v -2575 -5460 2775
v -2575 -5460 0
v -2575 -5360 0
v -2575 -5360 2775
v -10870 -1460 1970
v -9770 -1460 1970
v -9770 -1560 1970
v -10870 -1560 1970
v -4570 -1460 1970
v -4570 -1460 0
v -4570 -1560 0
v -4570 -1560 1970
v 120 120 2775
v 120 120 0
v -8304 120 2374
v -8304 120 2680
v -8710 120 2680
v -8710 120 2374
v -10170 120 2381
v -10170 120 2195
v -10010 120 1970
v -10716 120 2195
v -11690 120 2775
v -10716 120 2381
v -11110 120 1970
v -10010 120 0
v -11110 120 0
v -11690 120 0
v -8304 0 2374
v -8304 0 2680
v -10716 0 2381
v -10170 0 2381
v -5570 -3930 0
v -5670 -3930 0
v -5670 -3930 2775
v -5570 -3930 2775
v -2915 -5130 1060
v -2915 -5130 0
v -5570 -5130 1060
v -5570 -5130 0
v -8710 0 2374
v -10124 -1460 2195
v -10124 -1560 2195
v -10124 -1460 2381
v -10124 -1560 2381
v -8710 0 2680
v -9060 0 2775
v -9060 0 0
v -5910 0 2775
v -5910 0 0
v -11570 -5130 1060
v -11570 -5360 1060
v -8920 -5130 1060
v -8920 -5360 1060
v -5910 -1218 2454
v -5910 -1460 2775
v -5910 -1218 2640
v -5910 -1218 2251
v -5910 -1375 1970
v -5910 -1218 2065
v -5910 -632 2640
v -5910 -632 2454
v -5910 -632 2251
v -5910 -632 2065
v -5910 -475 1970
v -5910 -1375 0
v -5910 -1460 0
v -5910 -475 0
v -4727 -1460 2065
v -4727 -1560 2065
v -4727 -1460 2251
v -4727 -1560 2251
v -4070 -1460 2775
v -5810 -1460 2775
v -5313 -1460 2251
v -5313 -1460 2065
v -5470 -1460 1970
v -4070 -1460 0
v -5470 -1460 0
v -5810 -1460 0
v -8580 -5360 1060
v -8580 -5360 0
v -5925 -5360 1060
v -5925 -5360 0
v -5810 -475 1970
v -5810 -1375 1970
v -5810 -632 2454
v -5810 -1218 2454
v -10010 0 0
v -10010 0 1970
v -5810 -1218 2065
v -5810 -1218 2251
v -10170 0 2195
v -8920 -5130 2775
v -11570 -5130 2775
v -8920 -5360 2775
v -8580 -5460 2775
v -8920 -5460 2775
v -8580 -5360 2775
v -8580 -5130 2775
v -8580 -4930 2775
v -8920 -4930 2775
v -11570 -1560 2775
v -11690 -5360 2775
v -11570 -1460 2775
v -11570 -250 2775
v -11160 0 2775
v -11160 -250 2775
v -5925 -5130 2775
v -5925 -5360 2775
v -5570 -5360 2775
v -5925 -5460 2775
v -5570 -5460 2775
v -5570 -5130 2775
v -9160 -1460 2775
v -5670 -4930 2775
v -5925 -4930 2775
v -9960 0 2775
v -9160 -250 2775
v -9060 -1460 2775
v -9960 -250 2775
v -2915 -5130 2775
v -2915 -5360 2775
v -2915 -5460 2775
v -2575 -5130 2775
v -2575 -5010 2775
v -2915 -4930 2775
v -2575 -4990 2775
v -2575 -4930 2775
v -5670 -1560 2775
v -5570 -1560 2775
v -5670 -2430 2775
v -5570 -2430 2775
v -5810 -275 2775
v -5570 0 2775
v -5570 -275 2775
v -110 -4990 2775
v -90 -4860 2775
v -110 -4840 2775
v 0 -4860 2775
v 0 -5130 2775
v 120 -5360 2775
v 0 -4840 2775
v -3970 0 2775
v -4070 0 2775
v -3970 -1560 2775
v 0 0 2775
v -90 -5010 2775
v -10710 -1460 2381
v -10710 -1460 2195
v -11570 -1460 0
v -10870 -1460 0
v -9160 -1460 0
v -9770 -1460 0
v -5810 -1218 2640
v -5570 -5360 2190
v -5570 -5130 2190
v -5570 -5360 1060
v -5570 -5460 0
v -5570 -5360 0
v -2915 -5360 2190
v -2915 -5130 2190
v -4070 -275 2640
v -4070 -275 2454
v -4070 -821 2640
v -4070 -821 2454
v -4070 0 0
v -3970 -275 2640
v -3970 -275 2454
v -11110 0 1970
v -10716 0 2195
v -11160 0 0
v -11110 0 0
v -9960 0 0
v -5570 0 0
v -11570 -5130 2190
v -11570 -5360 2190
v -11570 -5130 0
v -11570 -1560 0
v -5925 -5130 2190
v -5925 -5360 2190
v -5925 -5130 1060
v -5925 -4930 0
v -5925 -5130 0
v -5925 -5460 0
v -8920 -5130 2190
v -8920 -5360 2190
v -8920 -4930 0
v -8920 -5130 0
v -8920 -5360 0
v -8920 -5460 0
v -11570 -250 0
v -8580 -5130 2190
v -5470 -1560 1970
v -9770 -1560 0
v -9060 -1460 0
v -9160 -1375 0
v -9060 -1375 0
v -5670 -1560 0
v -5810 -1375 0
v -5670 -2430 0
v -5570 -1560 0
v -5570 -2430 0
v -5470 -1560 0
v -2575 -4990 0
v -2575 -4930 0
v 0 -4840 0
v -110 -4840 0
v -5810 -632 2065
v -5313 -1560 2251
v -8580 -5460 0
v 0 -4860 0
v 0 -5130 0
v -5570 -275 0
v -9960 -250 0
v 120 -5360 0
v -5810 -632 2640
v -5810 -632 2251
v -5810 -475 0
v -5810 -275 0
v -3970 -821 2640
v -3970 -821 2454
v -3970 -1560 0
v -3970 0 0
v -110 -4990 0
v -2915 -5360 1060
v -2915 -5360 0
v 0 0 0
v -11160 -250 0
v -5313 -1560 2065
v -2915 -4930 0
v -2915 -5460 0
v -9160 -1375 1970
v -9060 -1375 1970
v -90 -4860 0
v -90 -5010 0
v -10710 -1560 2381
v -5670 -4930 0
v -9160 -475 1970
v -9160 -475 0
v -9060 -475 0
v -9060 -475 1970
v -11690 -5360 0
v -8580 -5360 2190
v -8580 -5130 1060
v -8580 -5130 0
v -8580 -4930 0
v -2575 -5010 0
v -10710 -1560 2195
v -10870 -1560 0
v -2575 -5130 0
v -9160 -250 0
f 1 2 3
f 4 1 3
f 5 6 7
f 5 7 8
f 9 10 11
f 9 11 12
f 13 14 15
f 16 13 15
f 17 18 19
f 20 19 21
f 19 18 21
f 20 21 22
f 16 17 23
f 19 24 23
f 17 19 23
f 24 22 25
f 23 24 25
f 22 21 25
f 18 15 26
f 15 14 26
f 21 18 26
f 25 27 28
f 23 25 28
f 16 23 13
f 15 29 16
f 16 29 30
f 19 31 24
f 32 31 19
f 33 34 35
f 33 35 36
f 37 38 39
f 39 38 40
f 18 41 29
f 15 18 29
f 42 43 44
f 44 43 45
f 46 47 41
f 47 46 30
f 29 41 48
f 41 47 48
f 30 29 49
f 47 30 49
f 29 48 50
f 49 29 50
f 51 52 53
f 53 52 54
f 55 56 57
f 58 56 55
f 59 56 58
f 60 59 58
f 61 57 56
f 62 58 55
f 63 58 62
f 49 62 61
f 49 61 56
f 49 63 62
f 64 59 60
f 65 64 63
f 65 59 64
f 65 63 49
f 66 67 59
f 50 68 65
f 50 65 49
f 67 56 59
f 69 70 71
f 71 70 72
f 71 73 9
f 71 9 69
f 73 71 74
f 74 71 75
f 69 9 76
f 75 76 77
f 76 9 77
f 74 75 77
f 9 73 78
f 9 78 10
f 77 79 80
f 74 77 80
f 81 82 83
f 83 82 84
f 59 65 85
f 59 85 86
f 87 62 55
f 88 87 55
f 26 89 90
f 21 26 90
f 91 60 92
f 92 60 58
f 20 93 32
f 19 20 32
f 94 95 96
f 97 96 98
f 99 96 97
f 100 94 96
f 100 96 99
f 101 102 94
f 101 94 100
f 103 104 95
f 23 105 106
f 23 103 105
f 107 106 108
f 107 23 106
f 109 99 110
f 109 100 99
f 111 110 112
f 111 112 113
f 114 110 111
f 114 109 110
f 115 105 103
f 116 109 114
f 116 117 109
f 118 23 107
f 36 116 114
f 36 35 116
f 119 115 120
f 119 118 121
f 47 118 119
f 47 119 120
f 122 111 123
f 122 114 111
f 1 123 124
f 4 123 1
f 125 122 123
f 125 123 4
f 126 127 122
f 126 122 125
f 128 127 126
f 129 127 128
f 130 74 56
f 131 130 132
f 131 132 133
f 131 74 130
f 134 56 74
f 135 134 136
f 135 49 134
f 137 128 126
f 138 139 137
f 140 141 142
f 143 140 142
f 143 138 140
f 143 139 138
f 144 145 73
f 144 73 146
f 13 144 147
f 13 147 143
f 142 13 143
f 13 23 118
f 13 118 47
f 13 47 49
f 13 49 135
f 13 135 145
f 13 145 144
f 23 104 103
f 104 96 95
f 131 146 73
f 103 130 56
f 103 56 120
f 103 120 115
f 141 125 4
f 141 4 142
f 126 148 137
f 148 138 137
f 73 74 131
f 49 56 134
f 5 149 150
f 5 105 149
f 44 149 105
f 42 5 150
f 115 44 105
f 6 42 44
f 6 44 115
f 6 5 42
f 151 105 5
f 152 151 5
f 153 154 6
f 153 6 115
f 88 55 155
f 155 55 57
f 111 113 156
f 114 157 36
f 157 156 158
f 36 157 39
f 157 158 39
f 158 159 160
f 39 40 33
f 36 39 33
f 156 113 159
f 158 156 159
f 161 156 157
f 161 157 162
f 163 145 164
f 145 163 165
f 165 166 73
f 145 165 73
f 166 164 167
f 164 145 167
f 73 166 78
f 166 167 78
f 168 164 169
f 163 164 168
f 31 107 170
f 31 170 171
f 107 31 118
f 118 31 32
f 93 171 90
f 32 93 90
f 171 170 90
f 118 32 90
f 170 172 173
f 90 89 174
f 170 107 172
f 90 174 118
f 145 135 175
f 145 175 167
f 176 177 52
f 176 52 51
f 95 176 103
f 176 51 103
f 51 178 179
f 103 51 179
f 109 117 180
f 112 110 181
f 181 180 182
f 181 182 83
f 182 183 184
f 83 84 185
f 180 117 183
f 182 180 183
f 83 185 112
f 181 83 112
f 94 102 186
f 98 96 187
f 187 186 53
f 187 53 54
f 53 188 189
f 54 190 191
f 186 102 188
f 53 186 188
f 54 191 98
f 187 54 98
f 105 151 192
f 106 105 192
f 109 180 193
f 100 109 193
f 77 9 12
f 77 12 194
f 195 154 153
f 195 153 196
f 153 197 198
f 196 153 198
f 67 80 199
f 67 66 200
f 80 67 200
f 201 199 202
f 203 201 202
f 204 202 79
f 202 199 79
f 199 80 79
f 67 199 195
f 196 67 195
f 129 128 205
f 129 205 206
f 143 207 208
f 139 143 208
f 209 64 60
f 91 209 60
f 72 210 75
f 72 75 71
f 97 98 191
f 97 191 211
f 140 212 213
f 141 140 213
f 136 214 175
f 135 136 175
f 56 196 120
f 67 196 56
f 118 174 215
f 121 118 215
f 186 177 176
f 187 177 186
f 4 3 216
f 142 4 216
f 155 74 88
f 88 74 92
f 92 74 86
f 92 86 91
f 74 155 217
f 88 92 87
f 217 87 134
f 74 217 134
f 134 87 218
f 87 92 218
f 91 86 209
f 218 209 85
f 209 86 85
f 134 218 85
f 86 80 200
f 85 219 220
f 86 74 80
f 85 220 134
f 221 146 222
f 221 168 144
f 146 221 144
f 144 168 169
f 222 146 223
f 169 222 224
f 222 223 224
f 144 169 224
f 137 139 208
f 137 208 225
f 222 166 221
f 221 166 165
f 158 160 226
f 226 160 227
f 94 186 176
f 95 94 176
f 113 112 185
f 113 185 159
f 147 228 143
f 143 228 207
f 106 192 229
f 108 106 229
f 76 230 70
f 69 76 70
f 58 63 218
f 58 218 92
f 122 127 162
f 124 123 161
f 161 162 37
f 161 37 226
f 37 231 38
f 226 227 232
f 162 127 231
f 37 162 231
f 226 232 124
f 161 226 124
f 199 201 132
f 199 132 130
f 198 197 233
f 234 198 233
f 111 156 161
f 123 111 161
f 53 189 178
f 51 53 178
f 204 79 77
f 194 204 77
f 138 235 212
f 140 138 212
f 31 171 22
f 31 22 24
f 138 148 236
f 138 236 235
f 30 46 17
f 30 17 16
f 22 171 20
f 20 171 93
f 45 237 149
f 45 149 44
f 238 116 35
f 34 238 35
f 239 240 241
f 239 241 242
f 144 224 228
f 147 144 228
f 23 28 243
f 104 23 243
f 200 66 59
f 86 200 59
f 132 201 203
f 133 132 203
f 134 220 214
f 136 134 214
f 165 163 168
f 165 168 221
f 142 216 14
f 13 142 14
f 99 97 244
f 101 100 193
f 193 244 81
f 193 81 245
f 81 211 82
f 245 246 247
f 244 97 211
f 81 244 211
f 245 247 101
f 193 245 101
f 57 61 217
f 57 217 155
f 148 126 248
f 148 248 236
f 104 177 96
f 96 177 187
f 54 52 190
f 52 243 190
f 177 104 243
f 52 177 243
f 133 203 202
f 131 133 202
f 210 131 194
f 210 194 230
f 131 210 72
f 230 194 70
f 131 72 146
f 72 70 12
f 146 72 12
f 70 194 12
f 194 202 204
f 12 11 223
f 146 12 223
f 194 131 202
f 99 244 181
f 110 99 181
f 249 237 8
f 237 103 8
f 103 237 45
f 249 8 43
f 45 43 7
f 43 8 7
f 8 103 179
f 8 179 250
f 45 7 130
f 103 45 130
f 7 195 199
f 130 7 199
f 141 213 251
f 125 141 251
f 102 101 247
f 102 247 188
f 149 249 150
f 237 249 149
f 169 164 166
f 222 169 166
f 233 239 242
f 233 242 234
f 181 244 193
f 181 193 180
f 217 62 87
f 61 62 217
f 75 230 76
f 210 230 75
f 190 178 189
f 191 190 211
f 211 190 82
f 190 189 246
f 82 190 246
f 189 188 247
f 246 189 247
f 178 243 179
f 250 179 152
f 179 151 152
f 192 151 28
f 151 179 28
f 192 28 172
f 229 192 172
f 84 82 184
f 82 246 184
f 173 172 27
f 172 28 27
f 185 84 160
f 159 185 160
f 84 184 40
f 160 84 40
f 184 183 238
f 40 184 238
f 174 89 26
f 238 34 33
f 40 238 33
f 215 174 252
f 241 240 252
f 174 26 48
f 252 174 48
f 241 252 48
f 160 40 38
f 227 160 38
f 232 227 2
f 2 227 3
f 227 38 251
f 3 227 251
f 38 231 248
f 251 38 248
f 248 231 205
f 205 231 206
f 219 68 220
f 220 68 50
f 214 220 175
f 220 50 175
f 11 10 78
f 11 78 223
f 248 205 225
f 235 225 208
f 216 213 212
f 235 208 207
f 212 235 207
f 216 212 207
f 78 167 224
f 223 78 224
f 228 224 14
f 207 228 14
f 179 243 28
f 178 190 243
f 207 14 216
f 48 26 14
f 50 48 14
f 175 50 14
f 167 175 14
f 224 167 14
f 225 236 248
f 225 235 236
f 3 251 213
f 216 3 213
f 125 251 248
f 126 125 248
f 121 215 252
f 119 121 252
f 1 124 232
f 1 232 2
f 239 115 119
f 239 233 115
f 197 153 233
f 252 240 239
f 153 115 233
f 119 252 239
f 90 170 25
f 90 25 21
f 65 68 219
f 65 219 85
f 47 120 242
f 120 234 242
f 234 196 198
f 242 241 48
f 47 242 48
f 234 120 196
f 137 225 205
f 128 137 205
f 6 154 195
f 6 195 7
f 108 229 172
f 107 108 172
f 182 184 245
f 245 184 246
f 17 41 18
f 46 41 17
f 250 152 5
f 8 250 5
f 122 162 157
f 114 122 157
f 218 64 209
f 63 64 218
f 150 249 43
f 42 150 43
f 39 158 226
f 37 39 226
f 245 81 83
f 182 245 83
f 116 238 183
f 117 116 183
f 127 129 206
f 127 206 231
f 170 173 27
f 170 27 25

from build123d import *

# Parameters (mm, degrees)
F1_DEPTH  = 2775
F2_W      = 1100
F2_H      = 1970
F3_DEPTH  = 120
F4_W      = 100
F4_H      = 1000
F5_DEPTH  = 2775
F4_H_2    = 970
F6_W      = 5900
F6_H      = 100
F7_DEPTH  = 2775
F8_W      = 100
F8_H      = 1460
F9_DEPTH  = 2775
F10_W     = 1100
F10_H     = 1970
F11_DEPTH = 100
F12_W     = 900
F12_H     = 1970
F13_DEPTH = 100
F14_W     = 100
F14_H     = 1185
F15_DEPTH = 2775
F16_W     = 900
F16_H     = 1970
F17_DEPTH = 100
F19_DEPTH = 2775
F20_W     = 900
F20_H     = 1970
F21_DEPTH = 100
F22_W     = 2655
F22_H     = 1130
F23_DEPTH = 230
F24_W     = 2650
F24_H     = 1130
F24_W_2   = 2655
F25_DEPTH = 230
F26_W     = 406
F26_H     = 306
F27_DEPTH = 120
F28_W     = 546
F28_H     = 186
F29_DEPTH = 100
F30_W     = 586
F30_H     = 186
F31_DEPTH = 100
F32_W     = 546
F32_H     = 186
F33_DEPTH = 120
F34_W     = 586
F34_H     = 186
F35_DEPTH = 100
F37_DEPTH = 2775
F38_W     = 586
F38_H     = 186
F39_DEPTH = 100


# Not quite as in the source:
# - a feature names something its author has since deleted; it is built from what else it names


with BuildPart() as f1:
    # F0 (on Top) → F1 (new body)
    with BuildSketch(Plane.XY):
        Polygon((120, 120), (-11690, 120), (-11690, -5360), (-8920, -5360), (-8920, -5460), (-8580, -5460), (-8580, -5360), (-5925, -5360), (-5925, -5460), (-5570, -5460), (-5570, -5360), (-2915, -5360), (-2915, -5460), (-2575, -5460), (-2575, -5360), (120, -5360), align=None)
        Polygon((-5570, 0), (0, 0), (0, -5130), (-2575, -5130), (-2575, -4930), (-2915, -4930), (-2915, -5130), (-5570, -5130), (-5570, -4930), (-5925, -4930), (-5925, -5130), (-8580, -5130), (-8580, -4930), (-8920, -4930), (-8920, -5130), (-11570, -5130), (-11570, -250), (-11160, -250), (-11160, 0), (-9960, 0), (-9960, -250), (-9070, -250), (-9070, 0), (-5910, 0), (-5910, -275), (-5570, -275), align=None, mode=Mode.SUBTRACT)
    extrude(amount=F1_DEPTH)

    # F2 (on face) → F3 (cut, through all)
    with BuildSketch(Plane.XZ):
        with Locations((-10560, 985)):
            Rectangle(F2_W, F2_H)
    extrude(amount=-F3_DEPTH, mode=Mode.SUBTRACT)

    # F4 (on Top) → F5 (join, through all)
    with BuildSketch(Plane.XY):
        with Locations((-5620, -4430)):
            Rectangle(F4_W, F4_H)
    extrude(amount=F5_DEPTH)



with BuildPart() as f5:
    # F4 (on Top) → F5, piece 2 (new body, through all)
    with BuildSketch(Plane.XY):
        with Locations((-5620, -1945)):
            Rectangle(F4_W, F4_H_2)
    extrude(amount=F5_DEPTH)


with BuildPart() as f1_1:
    add(f1.part)

    add(f5.part)  # F7 merges F5
    # F6 (on Top) → F7 (join, through all)
    with BuildSketch(Plane.XY):
        with Locations((-8620, -1510)):
            Rectangle(F6_W, F6_H)
    extrude(amount=F7_DEPTH)

    # F8 (on Top) → F9 (join, through all)
    with BuildSketch(Plane.XY):
        with Locations((-9110, -730)):
            Rectangle(F8_W, F8_H)
    extrude(amount=F9_DEPTH)

    # F10 (on face) → F11 (cut, through all)
    with BuildSketch(Plane(origin=(0, -1460, 0), x_dir=(-1, 0, 0), z_dir=(0, 1, 0))):
        with Locations((10320, 985)):
            Rectangle(F10_W, F10_H)
    extrude(amount=-F11_DEPTH, mode=Mode.SUBTRACT)

    # F12 (on face) → F13 (cut, through all)
    with BuildSketch(Plane(origin=(-9160, 0, 0), x_dir=(0, -1, 0), z_dir=(-1, 0, 0))):
        with Locations((924.9999999999, 985)):
            Rectangle(F12_W, F12_H)
    extrude(amount=-F13_DEPTH, mode=Mode.SUBTRACT)

    # F14 (on Top) → F15 (join, through all)
    with BuildSketch(Plane.XY):
        with Locations((-5860, -867.5)):
            Rectangle(F14_W, F14_H)
    extrude(amount=F15_DEPTH)

    # F16 (on face) → F17 (cut, through all)
    with BuildSketch(Plane(origin=(-5910, 0, 0), x_dir=(0, -1, 0), z_dir=(-1, 0, 0))):
        with Locations((925, 985)):
            Rectangle(F16_W, F16_H)
    extrude(amount=-F17_DEPTH, mode=Mode.SUBTRACT)

    # F18 (on Top) → F19 (join, through all)
    with BuildSketch(Plane.XY):
        Polygon((-5570, -1460), (-5570, -1560), (-3970, -1560), (-3970, 0), (-4070, 0), (-4070, -1460), align=None)
    extrude(amount=F19_DEPTH)

    # F20 (on face) → F21 (cut, through all)
    with BuildSketch(Plane(origin=(0, -1460, 0), x_dir=(-1, 0, 0), z_dir=(0, 1, 0))):
        with Locations((5020, 985)):
            Rectangle(F20_W, F20_H)
    extrude(amount=-F21_DEPTH, mode=Mode.SUBTRACT)

    # F22 (on face) → F23 (cut, through all)
    with BuildSketch(Plane.XZ.offset(5360)):
        with Locations((-4242.5, 1625)):
            Rectangle(F22_W, F22_H)
    extrude(amount=-F23_DEPTH, mode=Mode.SUBTRACT)

    # F24 (on face) → F25 (cut, through all)
    with BuildSketch(Plane.XZ.offset(5360)):
        with Locations((-10245, 1625)):
            Rectangle(F24_W, F24_H)
        with Locations((-7252.5, 1625)):
            Rectangle(F24_W_2, F24_H)
    extrude(amount=-F25_DEPTH, mode=Mode.SUBTRACT)

    # F26 (on face) → F27 (cut, through all)
    with BuildSketch(Plane.XZ):
        with Locations((-8507, 2527)):
            Rectangle(F26_W, F26_H)
    extrude(amount=-F27_DEPTH, mode=Mode.SUBTRACT)

    # F28 (on face) → F29 (cut, through all)
    with BuildSketch(Plane(origin=(-4070, 0, 0), x_dir=(0, -1, 0), z_dir=(-1, 0, 0))):
        with Locations((548, 2547)):
            Rectangle(F28_W, F28_H)
    extrude(amount=-F29_DEPTH, mode=Mode.SUBTRACT)

    # F30 (on face) → F31 (cut, through all)
    with BuildSketch(Plane(origin=(-5910, 0, 0), x_dir=(0, -1, 0), z_dir=(-1, 0, 0))):
        with Locations((925, 2547)):
            Rectangle(F30_W, F30_H)
        with Locations((925, 2158)):
            Rectangle(F30_W, F30_H)
    extrude(amount=-F31_DEPTH, mode=Mode.SUBTRACT)

    # F32 (on face) → F33 (cut, through all)
    with BuildSketch(Plane.XZ):
        with Locations((-10443, 2288)):
            Rectangle(F32_W, F32_H)
    extrude(amount=-F33_DEPTH, mode=Mode.SUBTRACT)

    # F34 (on face) → F35 (cut, through all)
    with BuildSketch(Plane.XZ.offset(1560)):
        with Locations((-10417, 2288)):
            Rectangle(F34_W, F34_H)
    extrude(amount=-F35_DEPTH, mode=Mode.SUBTRACT)

    # F36 (on Top) → F37 (join, through all)
    with BuildSketch(Plane.XY):
        Polygon((-110, -4990), (-2575, -4990), (-2575, -5010), (-90, -5010), (-90, -4860), (0, -4860), (0, -4840), (-110, -4840), align=None)
    extrude(amount=F37_DEPTH)

    # F38 (on face) → F39 (cut, through all)
    with BuildSketch(Plane.XZ.offset(1560)):
        with Locations((-5020, 2158)):
            Rectangle(F38_W, F38_H)
    extrude(amount=-F39_DEPTH, mode=Mode.SUBTRACT)


solid = f1_1.part
